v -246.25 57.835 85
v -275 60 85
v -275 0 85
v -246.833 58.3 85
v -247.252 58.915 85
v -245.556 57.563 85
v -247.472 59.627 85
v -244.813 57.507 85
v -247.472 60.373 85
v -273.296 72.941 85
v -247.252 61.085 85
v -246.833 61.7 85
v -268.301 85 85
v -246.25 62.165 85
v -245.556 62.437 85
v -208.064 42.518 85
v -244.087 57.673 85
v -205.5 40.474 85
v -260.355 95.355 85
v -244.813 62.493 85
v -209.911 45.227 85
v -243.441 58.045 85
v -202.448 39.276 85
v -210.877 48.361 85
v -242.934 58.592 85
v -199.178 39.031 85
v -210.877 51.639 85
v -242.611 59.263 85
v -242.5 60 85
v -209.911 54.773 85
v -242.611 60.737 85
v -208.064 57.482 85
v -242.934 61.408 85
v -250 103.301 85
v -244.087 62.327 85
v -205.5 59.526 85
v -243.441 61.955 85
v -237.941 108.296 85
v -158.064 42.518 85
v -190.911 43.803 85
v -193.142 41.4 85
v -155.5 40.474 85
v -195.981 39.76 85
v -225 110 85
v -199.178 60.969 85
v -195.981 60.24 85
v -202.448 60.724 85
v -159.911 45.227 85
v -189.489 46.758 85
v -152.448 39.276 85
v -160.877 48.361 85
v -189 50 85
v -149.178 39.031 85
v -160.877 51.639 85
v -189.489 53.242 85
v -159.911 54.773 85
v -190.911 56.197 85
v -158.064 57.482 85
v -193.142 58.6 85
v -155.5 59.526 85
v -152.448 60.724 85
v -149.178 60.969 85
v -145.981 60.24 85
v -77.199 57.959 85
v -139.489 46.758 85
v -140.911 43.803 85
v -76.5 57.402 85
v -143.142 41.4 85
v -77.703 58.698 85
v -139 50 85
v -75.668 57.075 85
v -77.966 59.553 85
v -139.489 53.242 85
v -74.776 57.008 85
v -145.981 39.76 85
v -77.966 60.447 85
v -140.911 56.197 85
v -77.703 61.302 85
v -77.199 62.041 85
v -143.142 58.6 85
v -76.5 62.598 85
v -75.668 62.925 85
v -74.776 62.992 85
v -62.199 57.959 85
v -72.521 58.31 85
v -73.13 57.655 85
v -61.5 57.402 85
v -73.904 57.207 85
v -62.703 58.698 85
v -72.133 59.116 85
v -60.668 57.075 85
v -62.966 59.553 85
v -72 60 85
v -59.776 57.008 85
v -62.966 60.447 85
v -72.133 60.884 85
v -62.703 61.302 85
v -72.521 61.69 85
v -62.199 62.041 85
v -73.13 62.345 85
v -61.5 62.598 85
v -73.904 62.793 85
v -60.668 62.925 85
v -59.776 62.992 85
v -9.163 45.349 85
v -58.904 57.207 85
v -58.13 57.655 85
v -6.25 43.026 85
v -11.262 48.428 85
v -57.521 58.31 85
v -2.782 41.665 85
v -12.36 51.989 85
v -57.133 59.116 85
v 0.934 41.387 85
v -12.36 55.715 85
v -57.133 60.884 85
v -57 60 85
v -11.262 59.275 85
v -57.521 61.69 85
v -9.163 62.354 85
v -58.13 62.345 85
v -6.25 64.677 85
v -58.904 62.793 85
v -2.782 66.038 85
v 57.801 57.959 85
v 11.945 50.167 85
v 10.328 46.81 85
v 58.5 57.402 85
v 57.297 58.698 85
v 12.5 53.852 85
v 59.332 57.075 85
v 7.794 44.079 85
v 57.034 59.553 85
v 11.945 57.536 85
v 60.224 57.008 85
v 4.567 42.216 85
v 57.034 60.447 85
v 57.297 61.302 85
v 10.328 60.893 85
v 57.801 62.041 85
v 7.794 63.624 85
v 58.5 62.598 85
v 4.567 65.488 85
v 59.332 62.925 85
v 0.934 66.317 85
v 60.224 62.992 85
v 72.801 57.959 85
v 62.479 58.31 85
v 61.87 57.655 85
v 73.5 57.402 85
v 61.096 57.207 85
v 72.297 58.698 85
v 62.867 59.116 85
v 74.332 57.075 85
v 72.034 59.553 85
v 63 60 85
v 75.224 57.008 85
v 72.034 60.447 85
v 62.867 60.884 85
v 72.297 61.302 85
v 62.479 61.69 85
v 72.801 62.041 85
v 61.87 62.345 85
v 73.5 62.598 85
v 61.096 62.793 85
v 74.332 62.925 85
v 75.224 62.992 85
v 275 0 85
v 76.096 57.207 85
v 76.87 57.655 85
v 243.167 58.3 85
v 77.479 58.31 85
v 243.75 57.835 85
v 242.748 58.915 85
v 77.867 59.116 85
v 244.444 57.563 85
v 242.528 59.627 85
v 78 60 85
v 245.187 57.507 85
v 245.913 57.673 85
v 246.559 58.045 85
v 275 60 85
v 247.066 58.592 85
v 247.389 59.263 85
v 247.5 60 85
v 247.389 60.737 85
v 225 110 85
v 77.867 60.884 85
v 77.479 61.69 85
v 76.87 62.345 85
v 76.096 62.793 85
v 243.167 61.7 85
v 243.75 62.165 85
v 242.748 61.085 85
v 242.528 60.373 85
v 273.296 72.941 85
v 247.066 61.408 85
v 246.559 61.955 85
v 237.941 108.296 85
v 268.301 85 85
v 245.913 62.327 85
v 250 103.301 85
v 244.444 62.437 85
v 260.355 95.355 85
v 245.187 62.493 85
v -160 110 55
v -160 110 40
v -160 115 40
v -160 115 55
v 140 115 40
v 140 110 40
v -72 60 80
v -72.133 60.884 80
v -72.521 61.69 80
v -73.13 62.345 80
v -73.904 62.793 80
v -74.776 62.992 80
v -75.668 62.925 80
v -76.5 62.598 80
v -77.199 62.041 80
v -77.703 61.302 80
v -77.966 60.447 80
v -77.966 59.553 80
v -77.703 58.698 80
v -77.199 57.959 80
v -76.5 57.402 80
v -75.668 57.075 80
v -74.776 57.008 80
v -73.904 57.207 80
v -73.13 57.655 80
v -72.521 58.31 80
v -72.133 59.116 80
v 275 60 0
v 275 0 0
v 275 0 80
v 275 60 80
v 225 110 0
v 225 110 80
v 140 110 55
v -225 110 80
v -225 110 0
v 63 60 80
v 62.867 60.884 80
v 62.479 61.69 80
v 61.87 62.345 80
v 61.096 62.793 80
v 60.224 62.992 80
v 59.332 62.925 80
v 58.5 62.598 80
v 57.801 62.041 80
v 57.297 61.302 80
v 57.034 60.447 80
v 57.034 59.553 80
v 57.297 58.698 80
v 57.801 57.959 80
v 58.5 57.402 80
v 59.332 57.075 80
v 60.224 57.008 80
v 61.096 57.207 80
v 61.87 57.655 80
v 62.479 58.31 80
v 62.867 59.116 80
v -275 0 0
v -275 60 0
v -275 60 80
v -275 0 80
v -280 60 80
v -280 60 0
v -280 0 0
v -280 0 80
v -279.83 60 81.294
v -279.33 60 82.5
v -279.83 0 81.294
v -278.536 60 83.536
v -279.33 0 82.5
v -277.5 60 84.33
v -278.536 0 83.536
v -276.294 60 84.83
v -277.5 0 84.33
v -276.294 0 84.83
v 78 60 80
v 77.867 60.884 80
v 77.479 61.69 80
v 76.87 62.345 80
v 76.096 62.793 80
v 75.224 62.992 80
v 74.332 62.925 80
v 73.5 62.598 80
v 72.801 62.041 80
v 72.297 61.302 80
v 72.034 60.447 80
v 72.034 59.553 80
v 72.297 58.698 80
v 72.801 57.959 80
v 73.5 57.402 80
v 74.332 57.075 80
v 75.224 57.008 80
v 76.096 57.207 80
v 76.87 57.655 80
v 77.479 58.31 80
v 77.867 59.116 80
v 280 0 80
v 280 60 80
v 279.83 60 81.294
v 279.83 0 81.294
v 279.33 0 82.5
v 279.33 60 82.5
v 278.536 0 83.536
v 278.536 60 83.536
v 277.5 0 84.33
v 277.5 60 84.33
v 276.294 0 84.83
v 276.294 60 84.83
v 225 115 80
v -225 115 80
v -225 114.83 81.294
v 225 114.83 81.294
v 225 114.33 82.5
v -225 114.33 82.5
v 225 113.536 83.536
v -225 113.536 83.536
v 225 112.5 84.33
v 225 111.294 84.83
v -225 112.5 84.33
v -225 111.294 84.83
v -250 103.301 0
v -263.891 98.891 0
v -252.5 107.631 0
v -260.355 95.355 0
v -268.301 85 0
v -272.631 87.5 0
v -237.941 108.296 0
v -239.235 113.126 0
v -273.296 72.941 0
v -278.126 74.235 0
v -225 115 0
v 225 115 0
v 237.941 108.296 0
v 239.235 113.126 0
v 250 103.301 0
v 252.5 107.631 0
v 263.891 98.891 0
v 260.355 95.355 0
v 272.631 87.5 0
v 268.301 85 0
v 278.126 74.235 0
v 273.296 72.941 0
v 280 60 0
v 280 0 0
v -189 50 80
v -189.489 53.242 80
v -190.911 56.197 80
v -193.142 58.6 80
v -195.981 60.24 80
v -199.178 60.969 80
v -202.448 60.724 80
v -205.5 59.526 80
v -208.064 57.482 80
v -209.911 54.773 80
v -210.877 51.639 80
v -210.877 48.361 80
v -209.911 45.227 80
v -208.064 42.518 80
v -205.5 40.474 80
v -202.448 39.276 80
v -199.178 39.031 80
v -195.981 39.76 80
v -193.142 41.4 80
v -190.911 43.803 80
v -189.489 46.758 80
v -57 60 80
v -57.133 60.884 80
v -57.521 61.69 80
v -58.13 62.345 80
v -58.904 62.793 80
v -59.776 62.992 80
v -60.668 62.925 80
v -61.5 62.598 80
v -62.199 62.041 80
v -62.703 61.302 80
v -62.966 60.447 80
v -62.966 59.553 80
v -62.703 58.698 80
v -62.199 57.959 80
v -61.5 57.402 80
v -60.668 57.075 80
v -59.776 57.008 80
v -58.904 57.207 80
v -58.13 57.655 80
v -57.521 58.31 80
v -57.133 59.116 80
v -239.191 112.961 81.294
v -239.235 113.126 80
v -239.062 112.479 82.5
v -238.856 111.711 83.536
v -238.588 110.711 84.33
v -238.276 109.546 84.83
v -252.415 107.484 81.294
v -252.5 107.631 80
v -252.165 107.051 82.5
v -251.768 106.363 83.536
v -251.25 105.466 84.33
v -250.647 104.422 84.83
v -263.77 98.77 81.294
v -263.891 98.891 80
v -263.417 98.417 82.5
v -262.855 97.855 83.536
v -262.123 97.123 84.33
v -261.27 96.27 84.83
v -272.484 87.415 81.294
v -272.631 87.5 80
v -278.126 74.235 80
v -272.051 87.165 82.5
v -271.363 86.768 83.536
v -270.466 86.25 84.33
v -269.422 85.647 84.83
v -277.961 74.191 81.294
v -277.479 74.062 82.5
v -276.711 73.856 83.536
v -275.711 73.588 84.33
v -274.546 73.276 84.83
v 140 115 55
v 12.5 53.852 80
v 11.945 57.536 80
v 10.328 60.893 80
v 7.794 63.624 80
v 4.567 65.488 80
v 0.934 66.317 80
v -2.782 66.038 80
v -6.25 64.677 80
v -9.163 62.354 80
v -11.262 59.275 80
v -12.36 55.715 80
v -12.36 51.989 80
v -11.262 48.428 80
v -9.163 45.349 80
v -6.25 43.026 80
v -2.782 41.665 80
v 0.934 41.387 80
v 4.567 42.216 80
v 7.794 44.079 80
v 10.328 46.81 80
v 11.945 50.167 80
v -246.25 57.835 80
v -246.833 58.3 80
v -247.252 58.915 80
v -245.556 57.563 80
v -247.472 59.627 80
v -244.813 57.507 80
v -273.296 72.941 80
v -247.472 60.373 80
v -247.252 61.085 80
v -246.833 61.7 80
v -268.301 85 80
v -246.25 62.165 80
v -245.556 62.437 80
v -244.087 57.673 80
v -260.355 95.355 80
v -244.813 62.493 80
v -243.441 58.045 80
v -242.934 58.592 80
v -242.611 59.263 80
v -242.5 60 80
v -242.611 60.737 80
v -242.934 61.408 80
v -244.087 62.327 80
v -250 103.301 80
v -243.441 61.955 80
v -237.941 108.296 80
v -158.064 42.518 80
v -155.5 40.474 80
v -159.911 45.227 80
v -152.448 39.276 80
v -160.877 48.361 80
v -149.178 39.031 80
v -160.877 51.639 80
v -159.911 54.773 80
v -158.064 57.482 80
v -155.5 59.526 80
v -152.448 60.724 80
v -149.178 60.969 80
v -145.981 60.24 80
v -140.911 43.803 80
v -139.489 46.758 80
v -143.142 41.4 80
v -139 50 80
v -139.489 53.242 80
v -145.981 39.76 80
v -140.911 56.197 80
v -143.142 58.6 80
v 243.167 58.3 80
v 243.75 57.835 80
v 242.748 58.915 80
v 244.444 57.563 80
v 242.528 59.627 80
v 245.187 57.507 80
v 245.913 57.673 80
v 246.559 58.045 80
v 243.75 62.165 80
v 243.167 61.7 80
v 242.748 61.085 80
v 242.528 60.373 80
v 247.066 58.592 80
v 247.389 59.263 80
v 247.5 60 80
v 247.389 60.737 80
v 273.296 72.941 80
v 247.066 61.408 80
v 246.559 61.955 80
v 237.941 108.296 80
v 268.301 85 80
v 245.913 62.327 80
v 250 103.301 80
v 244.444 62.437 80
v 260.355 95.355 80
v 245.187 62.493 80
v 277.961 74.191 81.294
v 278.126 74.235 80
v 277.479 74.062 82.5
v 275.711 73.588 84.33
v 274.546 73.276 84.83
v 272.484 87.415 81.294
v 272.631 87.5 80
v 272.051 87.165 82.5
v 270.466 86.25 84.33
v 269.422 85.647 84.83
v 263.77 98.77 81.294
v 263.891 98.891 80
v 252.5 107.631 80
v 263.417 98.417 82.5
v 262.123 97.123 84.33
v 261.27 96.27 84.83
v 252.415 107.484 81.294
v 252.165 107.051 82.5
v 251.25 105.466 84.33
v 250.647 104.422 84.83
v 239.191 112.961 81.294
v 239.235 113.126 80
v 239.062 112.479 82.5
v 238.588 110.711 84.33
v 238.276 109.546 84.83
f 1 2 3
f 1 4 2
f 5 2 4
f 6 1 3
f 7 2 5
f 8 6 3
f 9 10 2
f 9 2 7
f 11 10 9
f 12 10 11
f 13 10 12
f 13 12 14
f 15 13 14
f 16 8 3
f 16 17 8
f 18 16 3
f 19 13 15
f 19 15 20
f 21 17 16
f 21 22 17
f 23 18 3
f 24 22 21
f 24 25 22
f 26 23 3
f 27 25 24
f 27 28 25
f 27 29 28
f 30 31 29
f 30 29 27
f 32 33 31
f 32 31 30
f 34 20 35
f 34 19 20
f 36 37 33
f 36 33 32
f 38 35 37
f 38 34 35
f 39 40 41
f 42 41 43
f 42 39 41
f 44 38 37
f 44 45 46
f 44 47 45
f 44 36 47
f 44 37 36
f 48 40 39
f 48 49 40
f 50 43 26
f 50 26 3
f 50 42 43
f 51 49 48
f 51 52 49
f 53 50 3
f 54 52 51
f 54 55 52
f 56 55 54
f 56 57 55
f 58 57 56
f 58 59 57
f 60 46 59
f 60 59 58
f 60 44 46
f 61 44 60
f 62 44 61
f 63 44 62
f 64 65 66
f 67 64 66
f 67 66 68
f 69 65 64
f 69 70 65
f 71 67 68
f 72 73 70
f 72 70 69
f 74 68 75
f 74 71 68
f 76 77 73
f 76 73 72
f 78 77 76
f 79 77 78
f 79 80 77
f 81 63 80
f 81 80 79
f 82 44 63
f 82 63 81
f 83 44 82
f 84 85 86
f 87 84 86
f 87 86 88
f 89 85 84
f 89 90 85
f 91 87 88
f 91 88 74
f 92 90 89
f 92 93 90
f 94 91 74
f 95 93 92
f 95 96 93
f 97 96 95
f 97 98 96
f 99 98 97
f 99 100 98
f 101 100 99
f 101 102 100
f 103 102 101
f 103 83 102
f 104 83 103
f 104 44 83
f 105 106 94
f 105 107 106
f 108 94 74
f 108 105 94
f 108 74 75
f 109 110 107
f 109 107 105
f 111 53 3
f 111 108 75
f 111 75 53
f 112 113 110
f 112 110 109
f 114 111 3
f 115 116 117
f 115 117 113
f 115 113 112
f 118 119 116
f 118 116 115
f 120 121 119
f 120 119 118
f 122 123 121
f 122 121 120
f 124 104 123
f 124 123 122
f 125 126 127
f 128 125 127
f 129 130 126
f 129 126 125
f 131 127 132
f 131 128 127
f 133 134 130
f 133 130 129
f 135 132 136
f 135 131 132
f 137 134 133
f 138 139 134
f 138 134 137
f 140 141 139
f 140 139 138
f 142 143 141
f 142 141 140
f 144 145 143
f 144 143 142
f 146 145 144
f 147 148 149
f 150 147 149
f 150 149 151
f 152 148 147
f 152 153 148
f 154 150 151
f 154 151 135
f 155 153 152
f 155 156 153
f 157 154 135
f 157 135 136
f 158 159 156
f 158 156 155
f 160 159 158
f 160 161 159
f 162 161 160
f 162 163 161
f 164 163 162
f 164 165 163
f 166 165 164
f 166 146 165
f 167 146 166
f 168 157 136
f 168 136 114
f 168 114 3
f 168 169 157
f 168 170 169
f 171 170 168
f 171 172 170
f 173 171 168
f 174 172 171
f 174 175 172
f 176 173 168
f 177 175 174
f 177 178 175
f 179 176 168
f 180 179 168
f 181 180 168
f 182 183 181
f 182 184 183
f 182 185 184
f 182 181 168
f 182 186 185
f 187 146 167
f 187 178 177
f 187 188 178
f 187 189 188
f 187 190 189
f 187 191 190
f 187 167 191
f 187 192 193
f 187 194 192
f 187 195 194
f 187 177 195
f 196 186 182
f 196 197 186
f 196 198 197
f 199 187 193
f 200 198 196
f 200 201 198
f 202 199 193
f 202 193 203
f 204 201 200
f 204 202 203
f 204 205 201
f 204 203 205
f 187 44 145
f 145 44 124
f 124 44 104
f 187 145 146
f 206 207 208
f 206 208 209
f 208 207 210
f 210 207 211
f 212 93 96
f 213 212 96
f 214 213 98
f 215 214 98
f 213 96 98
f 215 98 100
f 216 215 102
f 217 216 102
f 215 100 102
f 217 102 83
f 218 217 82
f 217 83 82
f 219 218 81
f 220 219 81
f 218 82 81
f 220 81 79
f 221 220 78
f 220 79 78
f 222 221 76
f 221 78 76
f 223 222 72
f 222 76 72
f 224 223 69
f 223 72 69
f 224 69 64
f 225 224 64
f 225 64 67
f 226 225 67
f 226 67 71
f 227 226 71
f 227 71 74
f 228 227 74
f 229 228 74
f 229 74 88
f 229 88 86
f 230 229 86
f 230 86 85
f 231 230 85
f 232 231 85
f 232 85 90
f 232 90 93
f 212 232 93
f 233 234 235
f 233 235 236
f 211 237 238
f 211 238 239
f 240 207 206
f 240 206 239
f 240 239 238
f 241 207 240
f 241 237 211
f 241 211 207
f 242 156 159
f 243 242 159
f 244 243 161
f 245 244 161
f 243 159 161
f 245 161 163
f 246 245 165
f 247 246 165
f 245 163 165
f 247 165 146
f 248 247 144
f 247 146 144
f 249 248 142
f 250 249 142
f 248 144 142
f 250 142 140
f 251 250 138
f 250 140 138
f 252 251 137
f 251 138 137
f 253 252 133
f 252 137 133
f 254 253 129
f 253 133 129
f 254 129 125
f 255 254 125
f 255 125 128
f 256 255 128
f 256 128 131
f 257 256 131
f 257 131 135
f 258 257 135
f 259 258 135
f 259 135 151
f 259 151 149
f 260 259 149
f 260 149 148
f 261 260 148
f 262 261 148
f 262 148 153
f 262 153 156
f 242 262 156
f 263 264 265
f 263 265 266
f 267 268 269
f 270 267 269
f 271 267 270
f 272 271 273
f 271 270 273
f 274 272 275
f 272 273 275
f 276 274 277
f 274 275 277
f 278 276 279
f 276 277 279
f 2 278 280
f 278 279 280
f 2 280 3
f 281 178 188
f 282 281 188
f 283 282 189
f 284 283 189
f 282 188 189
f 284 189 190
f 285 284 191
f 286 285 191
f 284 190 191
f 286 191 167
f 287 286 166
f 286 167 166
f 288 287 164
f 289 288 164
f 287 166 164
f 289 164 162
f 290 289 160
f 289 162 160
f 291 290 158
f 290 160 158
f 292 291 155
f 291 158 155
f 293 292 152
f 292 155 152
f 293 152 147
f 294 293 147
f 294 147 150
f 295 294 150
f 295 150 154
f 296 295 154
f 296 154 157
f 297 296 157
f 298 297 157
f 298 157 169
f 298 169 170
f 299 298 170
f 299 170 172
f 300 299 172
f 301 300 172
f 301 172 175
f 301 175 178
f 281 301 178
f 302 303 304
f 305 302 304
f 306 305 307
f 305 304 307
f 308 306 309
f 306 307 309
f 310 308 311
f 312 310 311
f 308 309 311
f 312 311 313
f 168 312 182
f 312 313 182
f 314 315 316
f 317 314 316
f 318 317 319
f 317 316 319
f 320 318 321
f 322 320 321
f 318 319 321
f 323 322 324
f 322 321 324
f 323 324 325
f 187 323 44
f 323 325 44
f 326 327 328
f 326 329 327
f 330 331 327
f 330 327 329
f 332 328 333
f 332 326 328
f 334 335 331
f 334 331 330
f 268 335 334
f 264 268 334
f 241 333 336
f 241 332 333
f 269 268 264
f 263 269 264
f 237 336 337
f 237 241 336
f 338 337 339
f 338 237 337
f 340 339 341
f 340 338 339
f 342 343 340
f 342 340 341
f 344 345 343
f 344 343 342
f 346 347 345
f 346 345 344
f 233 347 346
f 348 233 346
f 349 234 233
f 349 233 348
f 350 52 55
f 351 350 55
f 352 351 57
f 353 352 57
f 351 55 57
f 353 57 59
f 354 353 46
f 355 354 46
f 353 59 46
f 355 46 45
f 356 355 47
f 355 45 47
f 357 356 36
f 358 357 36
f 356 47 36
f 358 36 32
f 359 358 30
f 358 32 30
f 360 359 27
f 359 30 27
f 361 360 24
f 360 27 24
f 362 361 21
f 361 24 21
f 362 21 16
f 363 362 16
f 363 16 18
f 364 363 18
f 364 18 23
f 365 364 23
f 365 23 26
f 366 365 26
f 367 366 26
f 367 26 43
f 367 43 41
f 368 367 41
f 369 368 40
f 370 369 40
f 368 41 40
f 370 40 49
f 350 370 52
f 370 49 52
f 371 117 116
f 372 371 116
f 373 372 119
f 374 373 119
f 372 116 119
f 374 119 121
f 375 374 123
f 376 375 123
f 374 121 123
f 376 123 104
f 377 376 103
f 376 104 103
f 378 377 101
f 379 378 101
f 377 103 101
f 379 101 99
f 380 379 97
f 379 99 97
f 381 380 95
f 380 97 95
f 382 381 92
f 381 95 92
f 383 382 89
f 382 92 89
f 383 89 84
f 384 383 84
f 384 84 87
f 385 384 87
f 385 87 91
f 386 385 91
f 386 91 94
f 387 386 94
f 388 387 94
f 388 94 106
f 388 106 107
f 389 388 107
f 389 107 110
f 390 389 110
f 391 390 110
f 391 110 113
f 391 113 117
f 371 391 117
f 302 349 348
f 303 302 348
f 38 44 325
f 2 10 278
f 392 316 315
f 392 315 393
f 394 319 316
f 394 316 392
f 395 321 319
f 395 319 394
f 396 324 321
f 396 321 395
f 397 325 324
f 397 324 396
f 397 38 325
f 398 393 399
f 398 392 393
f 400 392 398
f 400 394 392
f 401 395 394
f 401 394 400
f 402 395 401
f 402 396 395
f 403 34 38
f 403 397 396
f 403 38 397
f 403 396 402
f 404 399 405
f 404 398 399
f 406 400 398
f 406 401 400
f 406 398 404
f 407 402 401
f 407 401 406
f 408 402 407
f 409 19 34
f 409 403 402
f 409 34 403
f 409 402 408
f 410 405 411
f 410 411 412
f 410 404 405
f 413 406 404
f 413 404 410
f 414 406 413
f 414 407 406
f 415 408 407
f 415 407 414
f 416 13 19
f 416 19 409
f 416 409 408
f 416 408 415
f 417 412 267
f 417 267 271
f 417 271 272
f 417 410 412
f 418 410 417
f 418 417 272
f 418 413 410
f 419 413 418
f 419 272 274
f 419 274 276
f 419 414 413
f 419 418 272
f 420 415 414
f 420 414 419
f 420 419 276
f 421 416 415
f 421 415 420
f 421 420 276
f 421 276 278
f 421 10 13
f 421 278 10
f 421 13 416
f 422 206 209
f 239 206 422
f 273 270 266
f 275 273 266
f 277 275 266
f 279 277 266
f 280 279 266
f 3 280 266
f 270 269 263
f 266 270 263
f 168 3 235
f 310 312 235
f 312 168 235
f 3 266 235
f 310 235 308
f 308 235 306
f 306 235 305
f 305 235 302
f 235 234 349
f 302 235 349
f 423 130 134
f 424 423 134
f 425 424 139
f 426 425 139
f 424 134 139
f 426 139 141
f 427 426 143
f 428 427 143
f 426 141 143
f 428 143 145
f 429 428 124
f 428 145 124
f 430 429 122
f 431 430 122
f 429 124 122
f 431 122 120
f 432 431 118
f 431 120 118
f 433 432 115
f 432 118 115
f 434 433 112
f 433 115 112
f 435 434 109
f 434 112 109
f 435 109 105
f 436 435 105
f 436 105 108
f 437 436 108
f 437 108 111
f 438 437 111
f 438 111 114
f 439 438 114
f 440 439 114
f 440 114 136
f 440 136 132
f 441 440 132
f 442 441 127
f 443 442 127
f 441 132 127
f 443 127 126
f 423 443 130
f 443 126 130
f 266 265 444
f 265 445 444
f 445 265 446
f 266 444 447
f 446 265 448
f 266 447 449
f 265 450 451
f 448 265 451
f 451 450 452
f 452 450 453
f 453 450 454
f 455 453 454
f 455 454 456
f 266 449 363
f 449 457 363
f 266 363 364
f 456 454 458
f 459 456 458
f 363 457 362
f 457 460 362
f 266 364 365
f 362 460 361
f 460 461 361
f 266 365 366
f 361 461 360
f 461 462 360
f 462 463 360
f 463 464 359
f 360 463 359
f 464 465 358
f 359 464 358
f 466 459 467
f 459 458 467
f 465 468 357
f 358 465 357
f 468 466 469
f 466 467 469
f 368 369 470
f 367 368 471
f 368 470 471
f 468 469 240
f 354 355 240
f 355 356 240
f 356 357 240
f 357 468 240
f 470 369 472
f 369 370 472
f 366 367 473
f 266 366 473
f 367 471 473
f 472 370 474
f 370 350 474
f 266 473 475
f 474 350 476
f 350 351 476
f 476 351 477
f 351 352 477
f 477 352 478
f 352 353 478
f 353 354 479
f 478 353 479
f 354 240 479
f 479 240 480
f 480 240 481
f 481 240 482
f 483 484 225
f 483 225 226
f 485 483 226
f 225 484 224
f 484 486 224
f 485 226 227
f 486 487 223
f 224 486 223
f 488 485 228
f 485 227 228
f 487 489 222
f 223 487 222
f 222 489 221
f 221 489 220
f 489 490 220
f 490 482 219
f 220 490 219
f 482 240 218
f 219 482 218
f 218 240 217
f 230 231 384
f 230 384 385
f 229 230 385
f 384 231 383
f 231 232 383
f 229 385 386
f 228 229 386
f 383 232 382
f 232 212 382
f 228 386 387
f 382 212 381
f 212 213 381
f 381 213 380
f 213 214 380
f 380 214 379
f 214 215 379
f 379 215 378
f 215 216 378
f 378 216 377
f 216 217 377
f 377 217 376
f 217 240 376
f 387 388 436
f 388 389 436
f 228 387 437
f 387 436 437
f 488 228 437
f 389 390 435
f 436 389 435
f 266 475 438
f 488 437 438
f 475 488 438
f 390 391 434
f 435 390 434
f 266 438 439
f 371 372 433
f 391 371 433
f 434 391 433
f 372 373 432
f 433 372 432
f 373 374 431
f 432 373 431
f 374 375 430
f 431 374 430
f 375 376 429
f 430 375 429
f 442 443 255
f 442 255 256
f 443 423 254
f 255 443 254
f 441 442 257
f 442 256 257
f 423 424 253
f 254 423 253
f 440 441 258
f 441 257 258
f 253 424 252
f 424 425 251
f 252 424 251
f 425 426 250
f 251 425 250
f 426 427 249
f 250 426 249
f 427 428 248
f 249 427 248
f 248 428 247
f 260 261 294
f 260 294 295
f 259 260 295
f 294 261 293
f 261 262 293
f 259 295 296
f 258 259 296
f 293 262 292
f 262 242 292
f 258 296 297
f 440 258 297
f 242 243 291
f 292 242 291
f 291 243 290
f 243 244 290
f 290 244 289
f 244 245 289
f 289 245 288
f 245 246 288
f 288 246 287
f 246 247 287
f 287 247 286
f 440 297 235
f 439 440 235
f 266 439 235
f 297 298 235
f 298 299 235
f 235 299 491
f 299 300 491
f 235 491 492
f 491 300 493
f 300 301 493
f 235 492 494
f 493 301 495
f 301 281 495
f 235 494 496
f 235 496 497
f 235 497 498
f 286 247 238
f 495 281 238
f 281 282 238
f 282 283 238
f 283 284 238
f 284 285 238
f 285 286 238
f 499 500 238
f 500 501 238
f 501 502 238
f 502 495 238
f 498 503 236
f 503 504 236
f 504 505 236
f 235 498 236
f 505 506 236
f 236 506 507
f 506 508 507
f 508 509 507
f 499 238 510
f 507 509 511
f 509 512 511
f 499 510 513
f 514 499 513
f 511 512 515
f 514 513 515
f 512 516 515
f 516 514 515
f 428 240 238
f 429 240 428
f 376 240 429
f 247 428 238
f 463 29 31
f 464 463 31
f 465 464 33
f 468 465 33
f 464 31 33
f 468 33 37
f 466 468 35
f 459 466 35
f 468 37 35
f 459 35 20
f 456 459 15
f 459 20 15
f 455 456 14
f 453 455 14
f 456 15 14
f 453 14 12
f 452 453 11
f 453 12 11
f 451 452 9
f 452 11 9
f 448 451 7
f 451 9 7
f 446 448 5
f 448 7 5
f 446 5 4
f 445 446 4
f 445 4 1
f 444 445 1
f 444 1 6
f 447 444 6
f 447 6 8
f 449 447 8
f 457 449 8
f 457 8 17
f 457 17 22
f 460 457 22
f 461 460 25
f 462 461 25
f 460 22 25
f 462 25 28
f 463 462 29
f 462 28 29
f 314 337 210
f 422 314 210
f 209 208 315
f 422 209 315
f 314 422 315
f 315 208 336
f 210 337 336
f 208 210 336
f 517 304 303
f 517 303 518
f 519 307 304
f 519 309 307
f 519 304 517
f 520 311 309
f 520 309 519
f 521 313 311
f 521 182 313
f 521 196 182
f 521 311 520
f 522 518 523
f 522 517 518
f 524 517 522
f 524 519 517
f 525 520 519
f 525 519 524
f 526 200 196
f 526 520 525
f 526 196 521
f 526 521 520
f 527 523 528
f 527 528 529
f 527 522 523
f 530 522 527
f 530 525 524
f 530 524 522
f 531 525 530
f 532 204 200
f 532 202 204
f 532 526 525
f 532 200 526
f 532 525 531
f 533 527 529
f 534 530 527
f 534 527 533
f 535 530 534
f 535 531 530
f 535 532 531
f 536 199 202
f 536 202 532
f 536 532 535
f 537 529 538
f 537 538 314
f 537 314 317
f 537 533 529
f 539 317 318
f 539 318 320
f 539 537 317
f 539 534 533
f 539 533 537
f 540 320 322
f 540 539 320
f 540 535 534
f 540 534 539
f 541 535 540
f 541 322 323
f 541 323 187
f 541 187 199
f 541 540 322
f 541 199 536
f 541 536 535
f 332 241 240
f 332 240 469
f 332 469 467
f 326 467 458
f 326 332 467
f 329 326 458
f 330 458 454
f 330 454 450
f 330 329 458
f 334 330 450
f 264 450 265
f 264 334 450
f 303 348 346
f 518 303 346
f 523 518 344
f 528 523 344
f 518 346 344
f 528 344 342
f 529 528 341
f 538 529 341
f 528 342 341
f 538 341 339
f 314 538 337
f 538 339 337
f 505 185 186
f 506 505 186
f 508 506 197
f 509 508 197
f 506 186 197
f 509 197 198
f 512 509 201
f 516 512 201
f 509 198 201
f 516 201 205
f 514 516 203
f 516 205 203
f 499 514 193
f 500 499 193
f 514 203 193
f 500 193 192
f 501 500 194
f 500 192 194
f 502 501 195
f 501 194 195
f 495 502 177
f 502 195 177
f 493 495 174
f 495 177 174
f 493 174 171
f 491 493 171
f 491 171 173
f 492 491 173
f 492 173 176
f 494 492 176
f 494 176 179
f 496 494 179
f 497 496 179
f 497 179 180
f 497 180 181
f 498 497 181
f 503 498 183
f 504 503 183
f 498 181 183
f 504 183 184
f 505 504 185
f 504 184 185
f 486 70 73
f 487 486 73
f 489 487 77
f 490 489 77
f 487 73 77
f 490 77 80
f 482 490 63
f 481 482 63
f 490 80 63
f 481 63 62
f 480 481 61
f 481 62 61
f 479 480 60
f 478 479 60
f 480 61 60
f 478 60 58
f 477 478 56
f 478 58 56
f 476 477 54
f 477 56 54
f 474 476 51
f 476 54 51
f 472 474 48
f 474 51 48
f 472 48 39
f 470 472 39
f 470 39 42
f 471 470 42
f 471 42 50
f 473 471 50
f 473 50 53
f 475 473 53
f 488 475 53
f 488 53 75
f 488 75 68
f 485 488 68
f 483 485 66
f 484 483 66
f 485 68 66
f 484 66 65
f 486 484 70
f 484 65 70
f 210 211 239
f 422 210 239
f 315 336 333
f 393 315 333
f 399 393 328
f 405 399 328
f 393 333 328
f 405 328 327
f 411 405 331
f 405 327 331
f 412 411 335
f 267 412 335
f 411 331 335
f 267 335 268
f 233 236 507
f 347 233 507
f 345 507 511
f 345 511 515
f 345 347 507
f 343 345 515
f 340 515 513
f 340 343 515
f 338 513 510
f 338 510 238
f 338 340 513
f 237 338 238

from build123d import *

# Parameters (mm, degrees)
PAD_DEPTH       = 80
THICKNESS_T     = 5
SKETCH002_R     = 11
SKETCH002_R_2   = 2.5
POCKET001_DEPTH = 5
SKETCH003_W     = 300
SKETCH003_H     = 15
POCKET002_DEPTH = 5
SKETCH004_W     = 729.94403
SKETCH004_H     = 312.833175
POCKET_DEPTH    = 5
SKETCH005_R     = 3
HOLE_DEPTH      = 25
SKETCH006_R     = 12.5
POCKET003_DEPTH = 5


with BuildPart() as part:
    # Sketch → Pad (new body)
    with BuildSketch(Plane.XY):
        with BuildLine():
            Line((275, 0), (275, 60))
            ThreePointArc((275, 60), (260.355339, 95.355339), (225, 110))
            Line((225, 110), (-225, 110))
            ThreePointArc((-225, 110), (-260.355339, 95.355339), (-275, 60))
            Line((-275, 60), (-275, 0))
            Line((-275, 0), (275, 0))
        make_face()
    extrude(amount=PAD_DEPTH)

    # Thickness
    thickness_openings = [part.faces().sort_by_distance(p)[0] for p in [
        (0, 0, 40),
    ]]
    offset(amount=THICKNESS_T, openings=thickness_openings)

    # Sketch002 → Pocket001 (cut)
    with BuildSketch(Plane.XY.offset(85)):
        with Locations((-200, 50)):
            Circle(SKETCH002_R)
        with Locations((-150, 50)):
            Circle(SKETCH002_R)
        with Locations((-245, 60)):
            Circle(SKETCH002_R_2)
        with Locations((245, 60)):
            Circle(SKETCH002_R_2)
    extrude(amount=-POCKET001_DEPTH, mode=Mode.SUBTRACT)

    # Sketch003 (on Face15 of Pocket001) → Pocket002 (cut)
    with BuildSketch(Plane.XZ.offset(-110)):
        with Locations((-10, 47.5)):
            Rectangle(SKETCH003_W, SKETCH003_H)
    extrude(amount=-POCKET002_DEPTH, mode=Mode.SUBTRACT)

    # Sketch004 (on Face10 of Pocket002) → Pocket (cut)
    with BuildSketch(Plane(origin=(0, 0, -5), x_dir=(1, 0, 0), z_dir=(0, 0, -1))):
        with Locations((-35.610138, -20.133613)):
            Rectangle(SKETCH004_W, SKETCH004_H)
    extrude(amount=-POCKET_DEPTH, mode=Mode.SUBTRACT)

    # Sketch005 (on Face9 of Pocket) → Hole (cut)
    with BuildSketch(Plane.XY.offset(85)):
        with Locations((-75, 60)):
            Circle(SKETCH005_R)
        with Locations((-60, 60)):
            Circle(SKETCH005_R)
        with Locations((60, 60)):
            Circle(SKETCH005_R)
        with Locations((75, 60)):
            Circle(SKETCH005_R)
    extrude(amount=-HOLE_DEPTH, mode=Mode.SUBTRACT)

    # Sketch006 (on Face9 of Hole) → Pocket003 (cut)
    with BuildSketch(Plane.XY.offset(85)):
        with Locations((0, 53.851604)):
            Circle(SKETCH006_R)
    extrude(amount=-POCKET003_DEPTH, mode=Mode.SUBTRACT)


solid = part.part
